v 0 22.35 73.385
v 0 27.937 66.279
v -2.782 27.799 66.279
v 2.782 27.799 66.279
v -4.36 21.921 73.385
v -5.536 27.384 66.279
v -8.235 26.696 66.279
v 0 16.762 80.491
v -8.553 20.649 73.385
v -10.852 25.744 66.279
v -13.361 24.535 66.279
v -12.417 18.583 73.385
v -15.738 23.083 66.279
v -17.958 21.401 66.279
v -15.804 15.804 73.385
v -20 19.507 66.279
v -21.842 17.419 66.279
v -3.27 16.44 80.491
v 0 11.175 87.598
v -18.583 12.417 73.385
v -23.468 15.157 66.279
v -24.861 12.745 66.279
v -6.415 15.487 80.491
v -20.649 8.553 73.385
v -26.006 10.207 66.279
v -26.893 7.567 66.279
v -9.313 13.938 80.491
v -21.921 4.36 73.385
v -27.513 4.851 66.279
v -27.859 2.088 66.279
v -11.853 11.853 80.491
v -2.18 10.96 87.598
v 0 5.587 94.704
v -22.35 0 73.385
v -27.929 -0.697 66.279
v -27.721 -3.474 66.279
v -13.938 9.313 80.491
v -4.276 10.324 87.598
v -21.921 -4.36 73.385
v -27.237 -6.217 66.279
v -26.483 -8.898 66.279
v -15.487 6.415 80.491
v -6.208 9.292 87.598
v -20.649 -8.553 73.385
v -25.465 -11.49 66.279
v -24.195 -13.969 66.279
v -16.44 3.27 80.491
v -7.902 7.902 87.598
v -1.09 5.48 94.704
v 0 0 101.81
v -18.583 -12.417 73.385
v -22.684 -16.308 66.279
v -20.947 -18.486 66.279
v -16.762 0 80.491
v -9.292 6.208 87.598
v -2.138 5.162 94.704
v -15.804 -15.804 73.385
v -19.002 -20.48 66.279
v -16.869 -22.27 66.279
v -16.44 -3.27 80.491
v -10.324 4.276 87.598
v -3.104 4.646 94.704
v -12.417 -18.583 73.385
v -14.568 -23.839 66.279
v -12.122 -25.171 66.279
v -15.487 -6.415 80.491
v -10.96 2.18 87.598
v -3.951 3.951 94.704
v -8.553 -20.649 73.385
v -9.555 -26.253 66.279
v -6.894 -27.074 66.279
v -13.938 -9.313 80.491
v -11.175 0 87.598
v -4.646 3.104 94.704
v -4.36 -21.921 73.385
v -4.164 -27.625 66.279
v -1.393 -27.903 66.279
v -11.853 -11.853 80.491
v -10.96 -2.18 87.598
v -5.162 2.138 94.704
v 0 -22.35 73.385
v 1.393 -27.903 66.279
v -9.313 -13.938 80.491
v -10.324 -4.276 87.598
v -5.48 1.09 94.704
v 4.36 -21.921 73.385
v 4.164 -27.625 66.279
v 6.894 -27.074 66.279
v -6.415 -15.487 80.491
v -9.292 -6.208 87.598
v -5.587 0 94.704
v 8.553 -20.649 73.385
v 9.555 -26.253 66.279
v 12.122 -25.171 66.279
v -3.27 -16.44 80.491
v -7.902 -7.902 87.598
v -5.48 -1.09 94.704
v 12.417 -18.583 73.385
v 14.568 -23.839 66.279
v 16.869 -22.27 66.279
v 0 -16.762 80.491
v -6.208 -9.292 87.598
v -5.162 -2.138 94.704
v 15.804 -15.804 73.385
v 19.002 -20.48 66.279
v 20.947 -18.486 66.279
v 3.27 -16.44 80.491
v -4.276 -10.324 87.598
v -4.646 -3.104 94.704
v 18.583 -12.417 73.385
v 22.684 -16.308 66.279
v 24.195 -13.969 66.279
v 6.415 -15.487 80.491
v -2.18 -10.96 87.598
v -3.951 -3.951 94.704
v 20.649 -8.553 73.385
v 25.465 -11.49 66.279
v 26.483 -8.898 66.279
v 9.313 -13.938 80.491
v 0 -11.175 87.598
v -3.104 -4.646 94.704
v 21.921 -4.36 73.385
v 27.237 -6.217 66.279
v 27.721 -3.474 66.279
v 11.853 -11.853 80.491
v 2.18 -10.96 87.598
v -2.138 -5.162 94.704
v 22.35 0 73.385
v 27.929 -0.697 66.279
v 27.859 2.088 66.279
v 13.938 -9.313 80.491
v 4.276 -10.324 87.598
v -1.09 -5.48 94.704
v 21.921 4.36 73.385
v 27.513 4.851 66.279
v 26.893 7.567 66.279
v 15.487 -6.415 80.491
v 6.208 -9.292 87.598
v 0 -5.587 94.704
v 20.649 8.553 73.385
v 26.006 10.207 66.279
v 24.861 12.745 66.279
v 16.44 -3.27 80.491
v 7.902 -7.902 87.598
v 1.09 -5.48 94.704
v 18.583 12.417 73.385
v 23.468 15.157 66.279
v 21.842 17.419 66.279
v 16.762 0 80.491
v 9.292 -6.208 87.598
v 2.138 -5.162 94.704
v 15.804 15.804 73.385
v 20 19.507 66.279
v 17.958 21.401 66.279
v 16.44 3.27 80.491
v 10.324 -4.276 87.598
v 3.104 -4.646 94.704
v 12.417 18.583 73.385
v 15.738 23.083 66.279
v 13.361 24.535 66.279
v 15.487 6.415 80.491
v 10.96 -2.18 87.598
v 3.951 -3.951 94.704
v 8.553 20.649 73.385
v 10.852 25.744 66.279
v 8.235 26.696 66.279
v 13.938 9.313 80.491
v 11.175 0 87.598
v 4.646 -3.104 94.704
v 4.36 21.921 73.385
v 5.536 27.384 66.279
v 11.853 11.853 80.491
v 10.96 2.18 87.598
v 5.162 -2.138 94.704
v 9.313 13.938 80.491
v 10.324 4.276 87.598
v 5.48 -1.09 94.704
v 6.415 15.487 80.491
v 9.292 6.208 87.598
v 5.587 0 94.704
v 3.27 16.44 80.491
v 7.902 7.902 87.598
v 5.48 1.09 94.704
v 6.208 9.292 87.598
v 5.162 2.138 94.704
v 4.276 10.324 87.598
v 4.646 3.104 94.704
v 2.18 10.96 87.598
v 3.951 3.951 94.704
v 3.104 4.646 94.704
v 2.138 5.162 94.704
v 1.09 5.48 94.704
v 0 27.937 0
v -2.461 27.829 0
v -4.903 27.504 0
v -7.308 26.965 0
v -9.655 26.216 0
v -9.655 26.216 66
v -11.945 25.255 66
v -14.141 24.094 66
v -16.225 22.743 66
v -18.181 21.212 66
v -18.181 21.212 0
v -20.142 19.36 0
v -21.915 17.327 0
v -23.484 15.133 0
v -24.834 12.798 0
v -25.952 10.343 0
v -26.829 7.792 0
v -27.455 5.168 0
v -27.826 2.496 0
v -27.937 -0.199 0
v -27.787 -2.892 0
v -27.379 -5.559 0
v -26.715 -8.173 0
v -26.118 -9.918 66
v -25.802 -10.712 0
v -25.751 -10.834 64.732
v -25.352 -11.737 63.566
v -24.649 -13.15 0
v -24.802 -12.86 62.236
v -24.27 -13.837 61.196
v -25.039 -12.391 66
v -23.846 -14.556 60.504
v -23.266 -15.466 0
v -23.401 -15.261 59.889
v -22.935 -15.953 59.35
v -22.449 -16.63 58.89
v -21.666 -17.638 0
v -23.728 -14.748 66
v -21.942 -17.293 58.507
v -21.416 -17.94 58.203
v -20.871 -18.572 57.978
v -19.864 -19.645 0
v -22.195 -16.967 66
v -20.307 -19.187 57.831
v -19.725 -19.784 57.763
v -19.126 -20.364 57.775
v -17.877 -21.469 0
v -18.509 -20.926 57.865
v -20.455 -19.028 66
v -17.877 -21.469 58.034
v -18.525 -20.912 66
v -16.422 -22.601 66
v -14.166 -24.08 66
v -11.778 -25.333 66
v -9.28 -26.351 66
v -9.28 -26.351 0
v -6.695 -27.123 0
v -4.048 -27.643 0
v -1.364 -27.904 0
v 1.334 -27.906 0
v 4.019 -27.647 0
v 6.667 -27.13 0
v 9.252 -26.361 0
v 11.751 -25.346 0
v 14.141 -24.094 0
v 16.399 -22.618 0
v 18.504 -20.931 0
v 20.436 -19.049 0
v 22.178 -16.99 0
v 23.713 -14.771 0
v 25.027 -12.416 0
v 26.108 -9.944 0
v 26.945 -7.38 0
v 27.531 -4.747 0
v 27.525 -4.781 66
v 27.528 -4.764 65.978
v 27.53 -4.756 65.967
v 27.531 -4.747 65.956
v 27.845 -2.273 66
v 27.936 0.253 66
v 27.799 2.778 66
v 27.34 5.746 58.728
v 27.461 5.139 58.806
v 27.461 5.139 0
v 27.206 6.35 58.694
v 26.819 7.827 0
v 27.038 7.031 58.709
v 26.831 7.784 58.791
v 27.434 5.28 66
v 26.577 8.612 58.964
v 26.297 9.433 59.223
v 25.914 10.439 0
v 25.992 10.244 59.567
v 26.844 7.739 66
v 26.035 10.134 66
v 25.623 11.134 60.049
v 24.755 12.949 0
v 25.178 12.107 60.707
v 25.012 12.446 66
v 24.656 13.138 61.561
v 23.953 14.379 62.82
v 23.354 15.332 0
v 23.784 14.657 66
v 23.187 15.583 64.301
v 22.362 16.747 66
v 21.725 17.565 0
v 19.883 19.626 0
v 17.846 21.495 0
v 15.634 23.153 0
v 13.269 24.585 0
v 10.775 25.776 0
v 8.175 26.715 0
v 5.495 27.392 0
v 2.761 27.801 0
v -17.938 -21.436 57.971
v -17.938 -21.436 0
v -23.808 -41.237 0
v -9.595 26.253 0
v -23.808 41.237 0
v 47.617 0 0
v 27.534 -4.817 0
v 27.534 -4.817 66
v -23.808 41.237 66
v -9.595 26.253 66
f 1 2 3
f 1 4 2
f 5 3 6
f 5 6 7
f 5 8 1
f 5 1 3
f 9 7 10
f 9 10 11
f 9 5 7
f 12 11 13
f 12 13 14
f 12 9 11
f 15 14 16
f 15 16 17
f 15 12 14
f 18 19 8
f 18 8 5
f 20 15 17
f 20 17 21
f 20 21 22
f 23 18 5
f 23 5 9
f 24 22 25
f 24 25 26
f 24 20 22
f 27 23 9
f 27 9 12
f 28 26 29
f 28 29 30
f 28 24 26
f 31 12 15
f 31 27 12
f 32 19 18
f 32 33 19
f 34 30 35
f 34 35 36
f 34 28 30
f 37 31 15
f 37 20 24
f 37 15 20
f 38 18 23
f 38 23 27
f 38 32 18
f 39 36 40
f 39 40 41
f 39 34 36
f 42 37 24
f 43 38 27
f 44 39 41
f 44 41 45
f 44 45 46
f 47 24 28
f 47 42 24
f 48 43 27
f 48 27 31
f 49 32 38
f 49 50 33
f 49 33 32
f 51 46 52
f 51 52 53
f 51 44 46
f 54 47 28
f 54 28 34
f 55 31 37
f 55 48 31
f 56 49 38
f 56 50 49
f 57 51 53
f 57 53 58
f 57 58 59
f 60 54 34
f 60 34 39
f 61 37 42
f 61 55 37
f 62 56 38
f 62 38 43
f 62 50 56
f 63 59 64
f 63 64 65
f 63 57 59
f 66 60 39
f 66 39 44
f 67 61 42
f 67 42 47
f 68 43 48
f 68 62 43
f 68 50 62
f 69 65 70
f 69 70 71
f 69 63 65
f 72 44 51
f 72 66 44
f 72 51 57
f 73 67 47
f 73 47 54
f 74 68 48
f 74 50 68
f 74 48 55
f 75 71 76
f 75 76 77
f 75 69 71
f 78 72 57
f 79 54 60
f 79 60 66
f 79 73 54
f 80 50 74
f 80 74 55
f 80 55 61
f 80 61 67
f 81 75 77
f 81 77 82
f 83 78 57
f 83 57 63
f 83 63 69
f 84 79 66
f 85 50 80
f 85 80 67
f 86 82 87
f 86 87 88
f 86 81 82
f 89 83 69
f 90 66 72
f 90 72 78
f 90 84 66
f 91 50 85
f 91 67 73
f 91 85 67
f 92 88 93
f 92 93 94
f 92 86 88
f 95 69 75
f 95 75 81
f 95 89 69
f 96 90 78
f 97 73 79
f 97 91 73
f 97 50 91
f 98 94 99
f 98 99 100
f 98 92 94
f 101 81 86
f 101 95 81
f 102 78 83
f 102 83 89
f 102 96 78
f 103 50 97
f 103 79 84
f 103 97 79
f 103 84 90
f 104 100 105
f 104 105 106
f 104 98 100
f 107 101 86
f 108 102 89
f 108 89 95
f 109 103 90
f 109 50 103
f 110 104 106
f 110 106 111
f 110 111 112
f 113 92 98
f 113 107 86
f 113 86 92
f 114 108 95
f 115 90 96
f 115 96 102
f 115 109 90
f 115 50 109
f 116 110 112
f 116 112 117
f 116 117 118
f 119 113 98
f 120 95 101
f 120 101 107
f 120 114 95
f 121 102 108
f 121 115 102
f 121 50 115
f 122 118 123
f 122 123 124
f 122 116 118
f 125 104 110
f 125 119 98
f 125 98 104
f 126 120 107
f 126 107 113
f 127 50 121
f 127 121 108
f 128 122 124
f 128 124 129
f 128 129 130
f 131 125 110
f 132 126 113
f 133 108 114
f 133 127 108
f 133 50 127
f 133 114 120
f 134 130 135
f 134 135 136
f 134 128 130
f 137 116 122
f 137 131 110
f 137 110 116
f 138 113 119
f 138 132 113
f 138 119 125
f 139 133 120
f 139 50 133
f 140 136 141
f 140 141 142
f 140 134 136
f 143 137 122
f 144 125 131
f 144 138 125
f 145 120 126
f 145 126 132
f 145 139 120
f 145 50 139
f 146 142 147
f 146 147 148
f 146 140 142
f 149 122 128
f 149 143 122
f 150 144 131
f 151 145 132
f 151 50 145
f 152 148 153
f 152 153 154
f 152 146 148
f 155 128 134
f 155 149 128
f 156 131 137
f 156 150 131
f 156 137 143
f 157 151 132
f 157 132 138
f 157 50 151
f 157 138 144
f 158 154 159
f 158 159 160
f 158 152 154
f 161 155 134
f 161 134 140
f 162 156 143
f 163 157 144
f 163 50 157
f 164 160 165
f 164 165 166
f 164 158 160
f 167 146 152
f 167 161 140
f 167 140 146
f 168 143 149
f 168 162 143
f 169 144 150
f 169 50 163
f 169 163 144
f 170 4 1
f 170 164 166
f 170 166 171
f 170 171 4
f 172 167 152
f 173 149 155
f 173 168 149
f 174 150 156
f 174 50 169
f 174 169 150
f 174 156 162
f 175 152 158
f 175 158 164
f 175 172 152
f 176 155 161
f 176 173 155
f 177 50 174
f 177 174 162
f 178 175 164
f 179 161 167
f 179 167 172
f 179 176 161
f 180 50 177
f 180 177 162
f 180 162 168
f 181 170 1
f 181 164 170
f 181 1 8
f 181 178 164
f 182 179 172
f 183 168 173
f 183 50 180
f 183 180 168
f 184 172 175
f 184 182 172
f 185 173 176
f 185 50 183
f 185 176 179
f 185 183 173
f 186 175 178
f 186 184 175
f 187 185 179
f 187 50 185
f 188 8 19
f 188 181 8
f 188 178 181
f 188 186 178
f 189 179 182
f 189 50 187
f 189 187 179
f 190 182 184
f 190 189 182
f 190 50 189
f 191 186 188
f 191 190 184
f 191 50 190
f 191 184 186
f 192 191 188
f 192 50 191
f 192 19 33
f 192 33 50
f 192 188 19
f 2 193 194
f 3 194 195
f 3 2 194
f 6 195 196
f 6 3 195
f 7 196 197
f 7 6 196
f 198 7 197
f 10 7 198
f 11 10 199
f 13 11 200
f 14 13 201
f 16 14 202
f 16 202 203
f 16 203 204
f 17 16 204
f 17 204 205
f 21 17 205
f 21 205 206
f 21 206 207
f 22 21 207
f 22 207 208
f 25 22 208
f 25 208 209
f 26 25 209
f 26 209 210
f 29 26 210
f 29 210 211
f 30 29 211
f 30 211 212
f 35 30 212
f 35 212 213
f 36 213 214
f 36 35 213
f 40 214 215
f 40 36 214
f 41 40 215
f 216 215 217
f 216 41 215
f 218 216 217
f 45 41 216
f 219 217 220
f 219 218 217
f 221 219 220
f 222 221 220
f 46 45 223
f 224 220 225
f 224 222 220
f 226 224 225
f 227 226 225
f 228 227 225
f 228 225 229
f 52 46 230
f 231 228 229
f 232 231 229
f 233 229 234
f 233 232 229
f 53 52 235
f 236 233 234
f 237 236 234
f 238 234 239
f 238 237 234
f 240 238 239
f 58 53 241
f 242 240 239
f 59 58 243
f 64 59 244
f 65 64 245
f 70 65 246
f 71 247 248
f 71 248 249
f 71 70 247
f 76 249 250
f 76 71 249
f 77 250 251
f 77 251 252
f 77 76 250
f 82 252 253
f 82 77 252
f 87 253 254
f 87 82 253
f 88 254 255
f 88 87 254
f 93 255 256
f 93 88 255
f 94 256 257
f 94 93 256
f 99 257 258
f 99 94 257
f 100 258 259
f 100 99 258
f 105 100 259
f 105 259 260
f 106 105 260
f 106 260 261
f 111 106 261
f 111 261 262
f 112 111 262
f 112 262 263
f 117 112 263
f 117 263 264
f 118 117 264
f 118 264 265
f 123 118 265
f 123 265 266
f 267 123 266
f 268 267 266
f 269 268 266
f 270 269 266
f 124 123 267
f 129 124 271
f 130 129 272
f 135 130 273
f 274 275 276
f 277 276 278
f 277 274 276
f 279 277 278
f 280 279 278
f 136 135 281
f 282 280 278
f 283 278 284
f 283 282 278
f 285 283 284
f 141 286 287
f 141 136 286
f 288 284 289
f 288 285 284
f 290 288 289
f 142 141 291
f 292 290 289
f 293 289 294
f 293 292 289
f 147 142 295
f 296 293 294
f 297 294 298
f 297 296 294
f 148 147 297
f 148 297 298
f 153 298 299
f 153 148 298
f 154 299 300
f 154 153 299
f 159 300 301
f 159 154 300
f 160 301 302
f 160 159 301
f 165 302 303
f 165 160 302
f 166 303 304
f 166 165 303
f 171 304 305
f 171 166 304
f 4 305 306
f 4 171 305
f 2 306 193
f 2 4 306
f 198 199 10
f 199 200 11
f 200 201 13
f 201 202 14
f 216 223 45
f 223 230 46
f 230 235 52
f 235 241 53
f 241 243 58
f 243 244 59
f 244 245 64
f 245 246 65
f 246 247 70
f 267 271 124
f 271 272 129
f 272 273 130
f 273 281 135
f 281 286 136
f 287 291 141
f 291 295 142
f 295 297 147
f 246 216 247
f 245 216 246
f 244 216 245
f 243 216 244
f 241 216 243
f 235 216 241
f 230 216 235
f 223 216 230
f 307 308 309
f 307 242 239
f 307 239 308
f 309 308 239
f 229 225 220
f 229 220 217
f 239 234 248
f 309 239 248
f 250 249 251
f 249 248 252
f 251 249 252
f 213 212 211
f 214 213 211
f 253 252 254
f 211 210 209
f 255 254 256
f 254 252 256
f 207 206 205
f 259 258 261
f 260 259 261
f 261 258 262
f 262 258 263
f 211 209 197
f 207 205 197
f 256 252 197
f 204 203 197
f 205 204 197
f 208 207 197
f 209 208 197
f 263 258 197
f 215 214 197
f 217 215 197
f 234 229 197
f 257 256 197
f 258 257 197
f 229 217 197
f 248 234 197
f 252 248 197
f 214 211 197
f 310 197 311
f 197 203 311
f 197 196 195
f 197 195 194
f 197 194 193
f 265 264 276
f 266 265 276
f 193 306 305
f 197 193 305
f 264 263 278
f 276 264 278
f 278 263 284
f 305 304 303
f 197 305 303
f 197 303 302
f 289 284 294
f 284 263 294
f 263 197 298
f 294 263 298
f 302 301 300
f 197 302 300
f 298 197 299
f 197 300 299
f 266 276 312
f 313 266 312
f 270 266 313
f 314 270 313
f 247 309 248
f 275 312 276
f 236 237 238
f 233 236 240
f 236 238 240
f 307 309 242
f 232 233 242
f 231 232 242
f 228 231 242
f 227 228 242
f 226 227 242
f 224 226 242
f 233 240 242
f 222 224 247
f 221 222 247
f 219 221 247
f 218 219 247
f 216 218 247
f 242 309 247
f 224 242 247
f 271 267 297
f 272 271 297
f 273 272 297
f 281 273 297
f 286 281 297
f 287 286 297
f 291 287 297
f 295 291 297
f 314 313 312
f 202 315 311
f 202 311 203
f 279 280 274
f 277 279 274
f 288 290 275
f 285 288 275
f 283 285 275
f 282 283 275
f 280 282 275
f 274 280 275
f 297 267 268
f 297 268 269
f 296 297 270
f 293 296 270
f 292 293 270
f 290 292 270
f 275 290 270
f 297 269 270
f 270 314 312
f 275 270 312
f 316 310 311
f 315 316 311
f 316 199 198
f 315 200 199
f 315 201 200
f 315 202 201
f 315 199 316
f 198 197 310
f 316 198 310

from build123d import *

# Parameters (mm, degrees)
F3_DEPTH = 66
F5_DEPTH = 25
F7_DEPTH = 25


with BuildPart() as f1:
    # F0 (on Right) → F1 (revolve)
    with BuildSketch(Plane.YZ):
        Polygon((27.9374904931, 66.2788972259), (0, 101.8101840481), (0, 0), (27.9374904931, 0), align=None)
    revolve(axis=Axis((0, 0, 50.905092024), (0, 0, 1)))

    # F2 (on Top) → F3 (join)
    with BuildSketch(Plane.XY):
        Polygon((47.6167220591, 0), (27.1738618612, 5.2120122127), (27.5337807834, -4.8169167712), align=None)
        Polygon((-9.5953180999, 26.2534120063), (-23.8083610295, 41.2372909481), (-18.1006659117, 20.9272485844), align=None)
        Polygon((-17.9384626835, -21.4364952351), (-23.8083610295, -41.2372909481), (-9.0731959496, -26.1392607971), align=None)
    extrude(amount=F3_DEPTH)

    # F4 (on face) → F5 (cut)
    with BuildSketch(Plane(origin=(2.5903057561, -10.7996382035, 0), x_dir=(0.9724201368, 0.2332360983, 0), z_dir=(0.2332360983, -0.9724201368, 0))):
        Polygon((46.3034593785, 66), (25.6509240024, 66), (46.3034593785, 0), align=None)
    extrude(amount=-F5_DEPTH, mode=Mode.SUBTRACT)

    # F6 (on face) → F7 (cut)
    with BuildSketch(Plane(origin=(8.4188237579, -8.2164862973, 0), x_dir=(0.6984544852, 0.7156544782, 0), z_dir=(0.7156544782, -0.6984544852, 0))):
        Polygon((-46.1407084808, 66), (-46.1407084808, 0), (-25.3400105467, 66), align=None)
    extrude(amount=-F7_DEPTH, mode=Mode.SUBTRACT)


solid = f1.part
